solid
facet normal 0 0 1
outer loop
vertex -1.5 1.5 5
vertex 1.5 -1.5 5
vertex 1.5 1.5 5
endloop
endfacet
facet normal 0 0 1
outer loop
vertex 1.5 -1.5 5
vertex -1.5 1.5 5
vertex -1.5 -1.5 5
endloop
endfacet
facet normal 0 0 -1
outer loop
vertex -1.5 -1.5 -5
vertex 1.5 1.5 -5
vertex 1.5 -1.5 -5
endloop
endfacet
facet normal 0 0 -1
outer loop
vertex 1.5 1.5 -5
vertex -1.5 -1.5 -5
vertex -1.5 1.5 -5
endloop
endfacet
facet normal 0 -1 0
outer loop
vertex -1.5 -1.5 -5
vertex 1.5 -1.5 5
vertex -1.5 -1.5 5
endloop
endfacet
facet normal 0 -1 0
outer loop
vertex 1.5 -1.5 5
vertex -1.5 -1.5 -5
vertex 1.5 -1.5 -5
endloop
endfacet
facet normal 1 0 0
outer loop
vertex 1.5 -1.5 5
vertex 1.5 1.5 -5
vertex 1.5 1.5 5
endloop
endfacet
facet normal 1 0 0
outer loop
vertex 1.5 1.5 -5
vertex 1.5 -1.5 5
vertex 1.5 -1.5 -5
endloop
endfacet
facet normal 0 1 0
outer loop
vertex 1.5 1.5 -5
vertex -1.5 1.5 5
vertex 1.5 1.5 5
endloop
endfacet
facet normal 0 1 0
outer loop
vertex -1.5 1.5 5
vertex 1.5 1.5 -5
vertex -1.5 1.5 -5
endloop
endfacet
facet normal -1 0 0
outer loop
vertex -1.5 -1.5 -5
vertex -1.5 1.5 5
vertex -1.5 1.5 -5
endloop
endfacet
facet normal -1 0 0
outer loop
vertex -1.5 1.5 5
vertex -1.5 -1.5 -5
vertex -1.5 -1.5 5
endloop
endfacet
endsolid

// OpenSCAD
// file: config.scad
/**
 * Project configuration
 * All measures in millimeters
 */

material_z = 3;

mirror_triangle_x = 10;
mirror_symmetry = 6;
mirror_angle = 360 / mirror_symmetry;
// main file
include <config.scad>;

module canvas()
{
    cube([
        material_z,
        material_z,
        10
        ], center=true);
}

canvas();
